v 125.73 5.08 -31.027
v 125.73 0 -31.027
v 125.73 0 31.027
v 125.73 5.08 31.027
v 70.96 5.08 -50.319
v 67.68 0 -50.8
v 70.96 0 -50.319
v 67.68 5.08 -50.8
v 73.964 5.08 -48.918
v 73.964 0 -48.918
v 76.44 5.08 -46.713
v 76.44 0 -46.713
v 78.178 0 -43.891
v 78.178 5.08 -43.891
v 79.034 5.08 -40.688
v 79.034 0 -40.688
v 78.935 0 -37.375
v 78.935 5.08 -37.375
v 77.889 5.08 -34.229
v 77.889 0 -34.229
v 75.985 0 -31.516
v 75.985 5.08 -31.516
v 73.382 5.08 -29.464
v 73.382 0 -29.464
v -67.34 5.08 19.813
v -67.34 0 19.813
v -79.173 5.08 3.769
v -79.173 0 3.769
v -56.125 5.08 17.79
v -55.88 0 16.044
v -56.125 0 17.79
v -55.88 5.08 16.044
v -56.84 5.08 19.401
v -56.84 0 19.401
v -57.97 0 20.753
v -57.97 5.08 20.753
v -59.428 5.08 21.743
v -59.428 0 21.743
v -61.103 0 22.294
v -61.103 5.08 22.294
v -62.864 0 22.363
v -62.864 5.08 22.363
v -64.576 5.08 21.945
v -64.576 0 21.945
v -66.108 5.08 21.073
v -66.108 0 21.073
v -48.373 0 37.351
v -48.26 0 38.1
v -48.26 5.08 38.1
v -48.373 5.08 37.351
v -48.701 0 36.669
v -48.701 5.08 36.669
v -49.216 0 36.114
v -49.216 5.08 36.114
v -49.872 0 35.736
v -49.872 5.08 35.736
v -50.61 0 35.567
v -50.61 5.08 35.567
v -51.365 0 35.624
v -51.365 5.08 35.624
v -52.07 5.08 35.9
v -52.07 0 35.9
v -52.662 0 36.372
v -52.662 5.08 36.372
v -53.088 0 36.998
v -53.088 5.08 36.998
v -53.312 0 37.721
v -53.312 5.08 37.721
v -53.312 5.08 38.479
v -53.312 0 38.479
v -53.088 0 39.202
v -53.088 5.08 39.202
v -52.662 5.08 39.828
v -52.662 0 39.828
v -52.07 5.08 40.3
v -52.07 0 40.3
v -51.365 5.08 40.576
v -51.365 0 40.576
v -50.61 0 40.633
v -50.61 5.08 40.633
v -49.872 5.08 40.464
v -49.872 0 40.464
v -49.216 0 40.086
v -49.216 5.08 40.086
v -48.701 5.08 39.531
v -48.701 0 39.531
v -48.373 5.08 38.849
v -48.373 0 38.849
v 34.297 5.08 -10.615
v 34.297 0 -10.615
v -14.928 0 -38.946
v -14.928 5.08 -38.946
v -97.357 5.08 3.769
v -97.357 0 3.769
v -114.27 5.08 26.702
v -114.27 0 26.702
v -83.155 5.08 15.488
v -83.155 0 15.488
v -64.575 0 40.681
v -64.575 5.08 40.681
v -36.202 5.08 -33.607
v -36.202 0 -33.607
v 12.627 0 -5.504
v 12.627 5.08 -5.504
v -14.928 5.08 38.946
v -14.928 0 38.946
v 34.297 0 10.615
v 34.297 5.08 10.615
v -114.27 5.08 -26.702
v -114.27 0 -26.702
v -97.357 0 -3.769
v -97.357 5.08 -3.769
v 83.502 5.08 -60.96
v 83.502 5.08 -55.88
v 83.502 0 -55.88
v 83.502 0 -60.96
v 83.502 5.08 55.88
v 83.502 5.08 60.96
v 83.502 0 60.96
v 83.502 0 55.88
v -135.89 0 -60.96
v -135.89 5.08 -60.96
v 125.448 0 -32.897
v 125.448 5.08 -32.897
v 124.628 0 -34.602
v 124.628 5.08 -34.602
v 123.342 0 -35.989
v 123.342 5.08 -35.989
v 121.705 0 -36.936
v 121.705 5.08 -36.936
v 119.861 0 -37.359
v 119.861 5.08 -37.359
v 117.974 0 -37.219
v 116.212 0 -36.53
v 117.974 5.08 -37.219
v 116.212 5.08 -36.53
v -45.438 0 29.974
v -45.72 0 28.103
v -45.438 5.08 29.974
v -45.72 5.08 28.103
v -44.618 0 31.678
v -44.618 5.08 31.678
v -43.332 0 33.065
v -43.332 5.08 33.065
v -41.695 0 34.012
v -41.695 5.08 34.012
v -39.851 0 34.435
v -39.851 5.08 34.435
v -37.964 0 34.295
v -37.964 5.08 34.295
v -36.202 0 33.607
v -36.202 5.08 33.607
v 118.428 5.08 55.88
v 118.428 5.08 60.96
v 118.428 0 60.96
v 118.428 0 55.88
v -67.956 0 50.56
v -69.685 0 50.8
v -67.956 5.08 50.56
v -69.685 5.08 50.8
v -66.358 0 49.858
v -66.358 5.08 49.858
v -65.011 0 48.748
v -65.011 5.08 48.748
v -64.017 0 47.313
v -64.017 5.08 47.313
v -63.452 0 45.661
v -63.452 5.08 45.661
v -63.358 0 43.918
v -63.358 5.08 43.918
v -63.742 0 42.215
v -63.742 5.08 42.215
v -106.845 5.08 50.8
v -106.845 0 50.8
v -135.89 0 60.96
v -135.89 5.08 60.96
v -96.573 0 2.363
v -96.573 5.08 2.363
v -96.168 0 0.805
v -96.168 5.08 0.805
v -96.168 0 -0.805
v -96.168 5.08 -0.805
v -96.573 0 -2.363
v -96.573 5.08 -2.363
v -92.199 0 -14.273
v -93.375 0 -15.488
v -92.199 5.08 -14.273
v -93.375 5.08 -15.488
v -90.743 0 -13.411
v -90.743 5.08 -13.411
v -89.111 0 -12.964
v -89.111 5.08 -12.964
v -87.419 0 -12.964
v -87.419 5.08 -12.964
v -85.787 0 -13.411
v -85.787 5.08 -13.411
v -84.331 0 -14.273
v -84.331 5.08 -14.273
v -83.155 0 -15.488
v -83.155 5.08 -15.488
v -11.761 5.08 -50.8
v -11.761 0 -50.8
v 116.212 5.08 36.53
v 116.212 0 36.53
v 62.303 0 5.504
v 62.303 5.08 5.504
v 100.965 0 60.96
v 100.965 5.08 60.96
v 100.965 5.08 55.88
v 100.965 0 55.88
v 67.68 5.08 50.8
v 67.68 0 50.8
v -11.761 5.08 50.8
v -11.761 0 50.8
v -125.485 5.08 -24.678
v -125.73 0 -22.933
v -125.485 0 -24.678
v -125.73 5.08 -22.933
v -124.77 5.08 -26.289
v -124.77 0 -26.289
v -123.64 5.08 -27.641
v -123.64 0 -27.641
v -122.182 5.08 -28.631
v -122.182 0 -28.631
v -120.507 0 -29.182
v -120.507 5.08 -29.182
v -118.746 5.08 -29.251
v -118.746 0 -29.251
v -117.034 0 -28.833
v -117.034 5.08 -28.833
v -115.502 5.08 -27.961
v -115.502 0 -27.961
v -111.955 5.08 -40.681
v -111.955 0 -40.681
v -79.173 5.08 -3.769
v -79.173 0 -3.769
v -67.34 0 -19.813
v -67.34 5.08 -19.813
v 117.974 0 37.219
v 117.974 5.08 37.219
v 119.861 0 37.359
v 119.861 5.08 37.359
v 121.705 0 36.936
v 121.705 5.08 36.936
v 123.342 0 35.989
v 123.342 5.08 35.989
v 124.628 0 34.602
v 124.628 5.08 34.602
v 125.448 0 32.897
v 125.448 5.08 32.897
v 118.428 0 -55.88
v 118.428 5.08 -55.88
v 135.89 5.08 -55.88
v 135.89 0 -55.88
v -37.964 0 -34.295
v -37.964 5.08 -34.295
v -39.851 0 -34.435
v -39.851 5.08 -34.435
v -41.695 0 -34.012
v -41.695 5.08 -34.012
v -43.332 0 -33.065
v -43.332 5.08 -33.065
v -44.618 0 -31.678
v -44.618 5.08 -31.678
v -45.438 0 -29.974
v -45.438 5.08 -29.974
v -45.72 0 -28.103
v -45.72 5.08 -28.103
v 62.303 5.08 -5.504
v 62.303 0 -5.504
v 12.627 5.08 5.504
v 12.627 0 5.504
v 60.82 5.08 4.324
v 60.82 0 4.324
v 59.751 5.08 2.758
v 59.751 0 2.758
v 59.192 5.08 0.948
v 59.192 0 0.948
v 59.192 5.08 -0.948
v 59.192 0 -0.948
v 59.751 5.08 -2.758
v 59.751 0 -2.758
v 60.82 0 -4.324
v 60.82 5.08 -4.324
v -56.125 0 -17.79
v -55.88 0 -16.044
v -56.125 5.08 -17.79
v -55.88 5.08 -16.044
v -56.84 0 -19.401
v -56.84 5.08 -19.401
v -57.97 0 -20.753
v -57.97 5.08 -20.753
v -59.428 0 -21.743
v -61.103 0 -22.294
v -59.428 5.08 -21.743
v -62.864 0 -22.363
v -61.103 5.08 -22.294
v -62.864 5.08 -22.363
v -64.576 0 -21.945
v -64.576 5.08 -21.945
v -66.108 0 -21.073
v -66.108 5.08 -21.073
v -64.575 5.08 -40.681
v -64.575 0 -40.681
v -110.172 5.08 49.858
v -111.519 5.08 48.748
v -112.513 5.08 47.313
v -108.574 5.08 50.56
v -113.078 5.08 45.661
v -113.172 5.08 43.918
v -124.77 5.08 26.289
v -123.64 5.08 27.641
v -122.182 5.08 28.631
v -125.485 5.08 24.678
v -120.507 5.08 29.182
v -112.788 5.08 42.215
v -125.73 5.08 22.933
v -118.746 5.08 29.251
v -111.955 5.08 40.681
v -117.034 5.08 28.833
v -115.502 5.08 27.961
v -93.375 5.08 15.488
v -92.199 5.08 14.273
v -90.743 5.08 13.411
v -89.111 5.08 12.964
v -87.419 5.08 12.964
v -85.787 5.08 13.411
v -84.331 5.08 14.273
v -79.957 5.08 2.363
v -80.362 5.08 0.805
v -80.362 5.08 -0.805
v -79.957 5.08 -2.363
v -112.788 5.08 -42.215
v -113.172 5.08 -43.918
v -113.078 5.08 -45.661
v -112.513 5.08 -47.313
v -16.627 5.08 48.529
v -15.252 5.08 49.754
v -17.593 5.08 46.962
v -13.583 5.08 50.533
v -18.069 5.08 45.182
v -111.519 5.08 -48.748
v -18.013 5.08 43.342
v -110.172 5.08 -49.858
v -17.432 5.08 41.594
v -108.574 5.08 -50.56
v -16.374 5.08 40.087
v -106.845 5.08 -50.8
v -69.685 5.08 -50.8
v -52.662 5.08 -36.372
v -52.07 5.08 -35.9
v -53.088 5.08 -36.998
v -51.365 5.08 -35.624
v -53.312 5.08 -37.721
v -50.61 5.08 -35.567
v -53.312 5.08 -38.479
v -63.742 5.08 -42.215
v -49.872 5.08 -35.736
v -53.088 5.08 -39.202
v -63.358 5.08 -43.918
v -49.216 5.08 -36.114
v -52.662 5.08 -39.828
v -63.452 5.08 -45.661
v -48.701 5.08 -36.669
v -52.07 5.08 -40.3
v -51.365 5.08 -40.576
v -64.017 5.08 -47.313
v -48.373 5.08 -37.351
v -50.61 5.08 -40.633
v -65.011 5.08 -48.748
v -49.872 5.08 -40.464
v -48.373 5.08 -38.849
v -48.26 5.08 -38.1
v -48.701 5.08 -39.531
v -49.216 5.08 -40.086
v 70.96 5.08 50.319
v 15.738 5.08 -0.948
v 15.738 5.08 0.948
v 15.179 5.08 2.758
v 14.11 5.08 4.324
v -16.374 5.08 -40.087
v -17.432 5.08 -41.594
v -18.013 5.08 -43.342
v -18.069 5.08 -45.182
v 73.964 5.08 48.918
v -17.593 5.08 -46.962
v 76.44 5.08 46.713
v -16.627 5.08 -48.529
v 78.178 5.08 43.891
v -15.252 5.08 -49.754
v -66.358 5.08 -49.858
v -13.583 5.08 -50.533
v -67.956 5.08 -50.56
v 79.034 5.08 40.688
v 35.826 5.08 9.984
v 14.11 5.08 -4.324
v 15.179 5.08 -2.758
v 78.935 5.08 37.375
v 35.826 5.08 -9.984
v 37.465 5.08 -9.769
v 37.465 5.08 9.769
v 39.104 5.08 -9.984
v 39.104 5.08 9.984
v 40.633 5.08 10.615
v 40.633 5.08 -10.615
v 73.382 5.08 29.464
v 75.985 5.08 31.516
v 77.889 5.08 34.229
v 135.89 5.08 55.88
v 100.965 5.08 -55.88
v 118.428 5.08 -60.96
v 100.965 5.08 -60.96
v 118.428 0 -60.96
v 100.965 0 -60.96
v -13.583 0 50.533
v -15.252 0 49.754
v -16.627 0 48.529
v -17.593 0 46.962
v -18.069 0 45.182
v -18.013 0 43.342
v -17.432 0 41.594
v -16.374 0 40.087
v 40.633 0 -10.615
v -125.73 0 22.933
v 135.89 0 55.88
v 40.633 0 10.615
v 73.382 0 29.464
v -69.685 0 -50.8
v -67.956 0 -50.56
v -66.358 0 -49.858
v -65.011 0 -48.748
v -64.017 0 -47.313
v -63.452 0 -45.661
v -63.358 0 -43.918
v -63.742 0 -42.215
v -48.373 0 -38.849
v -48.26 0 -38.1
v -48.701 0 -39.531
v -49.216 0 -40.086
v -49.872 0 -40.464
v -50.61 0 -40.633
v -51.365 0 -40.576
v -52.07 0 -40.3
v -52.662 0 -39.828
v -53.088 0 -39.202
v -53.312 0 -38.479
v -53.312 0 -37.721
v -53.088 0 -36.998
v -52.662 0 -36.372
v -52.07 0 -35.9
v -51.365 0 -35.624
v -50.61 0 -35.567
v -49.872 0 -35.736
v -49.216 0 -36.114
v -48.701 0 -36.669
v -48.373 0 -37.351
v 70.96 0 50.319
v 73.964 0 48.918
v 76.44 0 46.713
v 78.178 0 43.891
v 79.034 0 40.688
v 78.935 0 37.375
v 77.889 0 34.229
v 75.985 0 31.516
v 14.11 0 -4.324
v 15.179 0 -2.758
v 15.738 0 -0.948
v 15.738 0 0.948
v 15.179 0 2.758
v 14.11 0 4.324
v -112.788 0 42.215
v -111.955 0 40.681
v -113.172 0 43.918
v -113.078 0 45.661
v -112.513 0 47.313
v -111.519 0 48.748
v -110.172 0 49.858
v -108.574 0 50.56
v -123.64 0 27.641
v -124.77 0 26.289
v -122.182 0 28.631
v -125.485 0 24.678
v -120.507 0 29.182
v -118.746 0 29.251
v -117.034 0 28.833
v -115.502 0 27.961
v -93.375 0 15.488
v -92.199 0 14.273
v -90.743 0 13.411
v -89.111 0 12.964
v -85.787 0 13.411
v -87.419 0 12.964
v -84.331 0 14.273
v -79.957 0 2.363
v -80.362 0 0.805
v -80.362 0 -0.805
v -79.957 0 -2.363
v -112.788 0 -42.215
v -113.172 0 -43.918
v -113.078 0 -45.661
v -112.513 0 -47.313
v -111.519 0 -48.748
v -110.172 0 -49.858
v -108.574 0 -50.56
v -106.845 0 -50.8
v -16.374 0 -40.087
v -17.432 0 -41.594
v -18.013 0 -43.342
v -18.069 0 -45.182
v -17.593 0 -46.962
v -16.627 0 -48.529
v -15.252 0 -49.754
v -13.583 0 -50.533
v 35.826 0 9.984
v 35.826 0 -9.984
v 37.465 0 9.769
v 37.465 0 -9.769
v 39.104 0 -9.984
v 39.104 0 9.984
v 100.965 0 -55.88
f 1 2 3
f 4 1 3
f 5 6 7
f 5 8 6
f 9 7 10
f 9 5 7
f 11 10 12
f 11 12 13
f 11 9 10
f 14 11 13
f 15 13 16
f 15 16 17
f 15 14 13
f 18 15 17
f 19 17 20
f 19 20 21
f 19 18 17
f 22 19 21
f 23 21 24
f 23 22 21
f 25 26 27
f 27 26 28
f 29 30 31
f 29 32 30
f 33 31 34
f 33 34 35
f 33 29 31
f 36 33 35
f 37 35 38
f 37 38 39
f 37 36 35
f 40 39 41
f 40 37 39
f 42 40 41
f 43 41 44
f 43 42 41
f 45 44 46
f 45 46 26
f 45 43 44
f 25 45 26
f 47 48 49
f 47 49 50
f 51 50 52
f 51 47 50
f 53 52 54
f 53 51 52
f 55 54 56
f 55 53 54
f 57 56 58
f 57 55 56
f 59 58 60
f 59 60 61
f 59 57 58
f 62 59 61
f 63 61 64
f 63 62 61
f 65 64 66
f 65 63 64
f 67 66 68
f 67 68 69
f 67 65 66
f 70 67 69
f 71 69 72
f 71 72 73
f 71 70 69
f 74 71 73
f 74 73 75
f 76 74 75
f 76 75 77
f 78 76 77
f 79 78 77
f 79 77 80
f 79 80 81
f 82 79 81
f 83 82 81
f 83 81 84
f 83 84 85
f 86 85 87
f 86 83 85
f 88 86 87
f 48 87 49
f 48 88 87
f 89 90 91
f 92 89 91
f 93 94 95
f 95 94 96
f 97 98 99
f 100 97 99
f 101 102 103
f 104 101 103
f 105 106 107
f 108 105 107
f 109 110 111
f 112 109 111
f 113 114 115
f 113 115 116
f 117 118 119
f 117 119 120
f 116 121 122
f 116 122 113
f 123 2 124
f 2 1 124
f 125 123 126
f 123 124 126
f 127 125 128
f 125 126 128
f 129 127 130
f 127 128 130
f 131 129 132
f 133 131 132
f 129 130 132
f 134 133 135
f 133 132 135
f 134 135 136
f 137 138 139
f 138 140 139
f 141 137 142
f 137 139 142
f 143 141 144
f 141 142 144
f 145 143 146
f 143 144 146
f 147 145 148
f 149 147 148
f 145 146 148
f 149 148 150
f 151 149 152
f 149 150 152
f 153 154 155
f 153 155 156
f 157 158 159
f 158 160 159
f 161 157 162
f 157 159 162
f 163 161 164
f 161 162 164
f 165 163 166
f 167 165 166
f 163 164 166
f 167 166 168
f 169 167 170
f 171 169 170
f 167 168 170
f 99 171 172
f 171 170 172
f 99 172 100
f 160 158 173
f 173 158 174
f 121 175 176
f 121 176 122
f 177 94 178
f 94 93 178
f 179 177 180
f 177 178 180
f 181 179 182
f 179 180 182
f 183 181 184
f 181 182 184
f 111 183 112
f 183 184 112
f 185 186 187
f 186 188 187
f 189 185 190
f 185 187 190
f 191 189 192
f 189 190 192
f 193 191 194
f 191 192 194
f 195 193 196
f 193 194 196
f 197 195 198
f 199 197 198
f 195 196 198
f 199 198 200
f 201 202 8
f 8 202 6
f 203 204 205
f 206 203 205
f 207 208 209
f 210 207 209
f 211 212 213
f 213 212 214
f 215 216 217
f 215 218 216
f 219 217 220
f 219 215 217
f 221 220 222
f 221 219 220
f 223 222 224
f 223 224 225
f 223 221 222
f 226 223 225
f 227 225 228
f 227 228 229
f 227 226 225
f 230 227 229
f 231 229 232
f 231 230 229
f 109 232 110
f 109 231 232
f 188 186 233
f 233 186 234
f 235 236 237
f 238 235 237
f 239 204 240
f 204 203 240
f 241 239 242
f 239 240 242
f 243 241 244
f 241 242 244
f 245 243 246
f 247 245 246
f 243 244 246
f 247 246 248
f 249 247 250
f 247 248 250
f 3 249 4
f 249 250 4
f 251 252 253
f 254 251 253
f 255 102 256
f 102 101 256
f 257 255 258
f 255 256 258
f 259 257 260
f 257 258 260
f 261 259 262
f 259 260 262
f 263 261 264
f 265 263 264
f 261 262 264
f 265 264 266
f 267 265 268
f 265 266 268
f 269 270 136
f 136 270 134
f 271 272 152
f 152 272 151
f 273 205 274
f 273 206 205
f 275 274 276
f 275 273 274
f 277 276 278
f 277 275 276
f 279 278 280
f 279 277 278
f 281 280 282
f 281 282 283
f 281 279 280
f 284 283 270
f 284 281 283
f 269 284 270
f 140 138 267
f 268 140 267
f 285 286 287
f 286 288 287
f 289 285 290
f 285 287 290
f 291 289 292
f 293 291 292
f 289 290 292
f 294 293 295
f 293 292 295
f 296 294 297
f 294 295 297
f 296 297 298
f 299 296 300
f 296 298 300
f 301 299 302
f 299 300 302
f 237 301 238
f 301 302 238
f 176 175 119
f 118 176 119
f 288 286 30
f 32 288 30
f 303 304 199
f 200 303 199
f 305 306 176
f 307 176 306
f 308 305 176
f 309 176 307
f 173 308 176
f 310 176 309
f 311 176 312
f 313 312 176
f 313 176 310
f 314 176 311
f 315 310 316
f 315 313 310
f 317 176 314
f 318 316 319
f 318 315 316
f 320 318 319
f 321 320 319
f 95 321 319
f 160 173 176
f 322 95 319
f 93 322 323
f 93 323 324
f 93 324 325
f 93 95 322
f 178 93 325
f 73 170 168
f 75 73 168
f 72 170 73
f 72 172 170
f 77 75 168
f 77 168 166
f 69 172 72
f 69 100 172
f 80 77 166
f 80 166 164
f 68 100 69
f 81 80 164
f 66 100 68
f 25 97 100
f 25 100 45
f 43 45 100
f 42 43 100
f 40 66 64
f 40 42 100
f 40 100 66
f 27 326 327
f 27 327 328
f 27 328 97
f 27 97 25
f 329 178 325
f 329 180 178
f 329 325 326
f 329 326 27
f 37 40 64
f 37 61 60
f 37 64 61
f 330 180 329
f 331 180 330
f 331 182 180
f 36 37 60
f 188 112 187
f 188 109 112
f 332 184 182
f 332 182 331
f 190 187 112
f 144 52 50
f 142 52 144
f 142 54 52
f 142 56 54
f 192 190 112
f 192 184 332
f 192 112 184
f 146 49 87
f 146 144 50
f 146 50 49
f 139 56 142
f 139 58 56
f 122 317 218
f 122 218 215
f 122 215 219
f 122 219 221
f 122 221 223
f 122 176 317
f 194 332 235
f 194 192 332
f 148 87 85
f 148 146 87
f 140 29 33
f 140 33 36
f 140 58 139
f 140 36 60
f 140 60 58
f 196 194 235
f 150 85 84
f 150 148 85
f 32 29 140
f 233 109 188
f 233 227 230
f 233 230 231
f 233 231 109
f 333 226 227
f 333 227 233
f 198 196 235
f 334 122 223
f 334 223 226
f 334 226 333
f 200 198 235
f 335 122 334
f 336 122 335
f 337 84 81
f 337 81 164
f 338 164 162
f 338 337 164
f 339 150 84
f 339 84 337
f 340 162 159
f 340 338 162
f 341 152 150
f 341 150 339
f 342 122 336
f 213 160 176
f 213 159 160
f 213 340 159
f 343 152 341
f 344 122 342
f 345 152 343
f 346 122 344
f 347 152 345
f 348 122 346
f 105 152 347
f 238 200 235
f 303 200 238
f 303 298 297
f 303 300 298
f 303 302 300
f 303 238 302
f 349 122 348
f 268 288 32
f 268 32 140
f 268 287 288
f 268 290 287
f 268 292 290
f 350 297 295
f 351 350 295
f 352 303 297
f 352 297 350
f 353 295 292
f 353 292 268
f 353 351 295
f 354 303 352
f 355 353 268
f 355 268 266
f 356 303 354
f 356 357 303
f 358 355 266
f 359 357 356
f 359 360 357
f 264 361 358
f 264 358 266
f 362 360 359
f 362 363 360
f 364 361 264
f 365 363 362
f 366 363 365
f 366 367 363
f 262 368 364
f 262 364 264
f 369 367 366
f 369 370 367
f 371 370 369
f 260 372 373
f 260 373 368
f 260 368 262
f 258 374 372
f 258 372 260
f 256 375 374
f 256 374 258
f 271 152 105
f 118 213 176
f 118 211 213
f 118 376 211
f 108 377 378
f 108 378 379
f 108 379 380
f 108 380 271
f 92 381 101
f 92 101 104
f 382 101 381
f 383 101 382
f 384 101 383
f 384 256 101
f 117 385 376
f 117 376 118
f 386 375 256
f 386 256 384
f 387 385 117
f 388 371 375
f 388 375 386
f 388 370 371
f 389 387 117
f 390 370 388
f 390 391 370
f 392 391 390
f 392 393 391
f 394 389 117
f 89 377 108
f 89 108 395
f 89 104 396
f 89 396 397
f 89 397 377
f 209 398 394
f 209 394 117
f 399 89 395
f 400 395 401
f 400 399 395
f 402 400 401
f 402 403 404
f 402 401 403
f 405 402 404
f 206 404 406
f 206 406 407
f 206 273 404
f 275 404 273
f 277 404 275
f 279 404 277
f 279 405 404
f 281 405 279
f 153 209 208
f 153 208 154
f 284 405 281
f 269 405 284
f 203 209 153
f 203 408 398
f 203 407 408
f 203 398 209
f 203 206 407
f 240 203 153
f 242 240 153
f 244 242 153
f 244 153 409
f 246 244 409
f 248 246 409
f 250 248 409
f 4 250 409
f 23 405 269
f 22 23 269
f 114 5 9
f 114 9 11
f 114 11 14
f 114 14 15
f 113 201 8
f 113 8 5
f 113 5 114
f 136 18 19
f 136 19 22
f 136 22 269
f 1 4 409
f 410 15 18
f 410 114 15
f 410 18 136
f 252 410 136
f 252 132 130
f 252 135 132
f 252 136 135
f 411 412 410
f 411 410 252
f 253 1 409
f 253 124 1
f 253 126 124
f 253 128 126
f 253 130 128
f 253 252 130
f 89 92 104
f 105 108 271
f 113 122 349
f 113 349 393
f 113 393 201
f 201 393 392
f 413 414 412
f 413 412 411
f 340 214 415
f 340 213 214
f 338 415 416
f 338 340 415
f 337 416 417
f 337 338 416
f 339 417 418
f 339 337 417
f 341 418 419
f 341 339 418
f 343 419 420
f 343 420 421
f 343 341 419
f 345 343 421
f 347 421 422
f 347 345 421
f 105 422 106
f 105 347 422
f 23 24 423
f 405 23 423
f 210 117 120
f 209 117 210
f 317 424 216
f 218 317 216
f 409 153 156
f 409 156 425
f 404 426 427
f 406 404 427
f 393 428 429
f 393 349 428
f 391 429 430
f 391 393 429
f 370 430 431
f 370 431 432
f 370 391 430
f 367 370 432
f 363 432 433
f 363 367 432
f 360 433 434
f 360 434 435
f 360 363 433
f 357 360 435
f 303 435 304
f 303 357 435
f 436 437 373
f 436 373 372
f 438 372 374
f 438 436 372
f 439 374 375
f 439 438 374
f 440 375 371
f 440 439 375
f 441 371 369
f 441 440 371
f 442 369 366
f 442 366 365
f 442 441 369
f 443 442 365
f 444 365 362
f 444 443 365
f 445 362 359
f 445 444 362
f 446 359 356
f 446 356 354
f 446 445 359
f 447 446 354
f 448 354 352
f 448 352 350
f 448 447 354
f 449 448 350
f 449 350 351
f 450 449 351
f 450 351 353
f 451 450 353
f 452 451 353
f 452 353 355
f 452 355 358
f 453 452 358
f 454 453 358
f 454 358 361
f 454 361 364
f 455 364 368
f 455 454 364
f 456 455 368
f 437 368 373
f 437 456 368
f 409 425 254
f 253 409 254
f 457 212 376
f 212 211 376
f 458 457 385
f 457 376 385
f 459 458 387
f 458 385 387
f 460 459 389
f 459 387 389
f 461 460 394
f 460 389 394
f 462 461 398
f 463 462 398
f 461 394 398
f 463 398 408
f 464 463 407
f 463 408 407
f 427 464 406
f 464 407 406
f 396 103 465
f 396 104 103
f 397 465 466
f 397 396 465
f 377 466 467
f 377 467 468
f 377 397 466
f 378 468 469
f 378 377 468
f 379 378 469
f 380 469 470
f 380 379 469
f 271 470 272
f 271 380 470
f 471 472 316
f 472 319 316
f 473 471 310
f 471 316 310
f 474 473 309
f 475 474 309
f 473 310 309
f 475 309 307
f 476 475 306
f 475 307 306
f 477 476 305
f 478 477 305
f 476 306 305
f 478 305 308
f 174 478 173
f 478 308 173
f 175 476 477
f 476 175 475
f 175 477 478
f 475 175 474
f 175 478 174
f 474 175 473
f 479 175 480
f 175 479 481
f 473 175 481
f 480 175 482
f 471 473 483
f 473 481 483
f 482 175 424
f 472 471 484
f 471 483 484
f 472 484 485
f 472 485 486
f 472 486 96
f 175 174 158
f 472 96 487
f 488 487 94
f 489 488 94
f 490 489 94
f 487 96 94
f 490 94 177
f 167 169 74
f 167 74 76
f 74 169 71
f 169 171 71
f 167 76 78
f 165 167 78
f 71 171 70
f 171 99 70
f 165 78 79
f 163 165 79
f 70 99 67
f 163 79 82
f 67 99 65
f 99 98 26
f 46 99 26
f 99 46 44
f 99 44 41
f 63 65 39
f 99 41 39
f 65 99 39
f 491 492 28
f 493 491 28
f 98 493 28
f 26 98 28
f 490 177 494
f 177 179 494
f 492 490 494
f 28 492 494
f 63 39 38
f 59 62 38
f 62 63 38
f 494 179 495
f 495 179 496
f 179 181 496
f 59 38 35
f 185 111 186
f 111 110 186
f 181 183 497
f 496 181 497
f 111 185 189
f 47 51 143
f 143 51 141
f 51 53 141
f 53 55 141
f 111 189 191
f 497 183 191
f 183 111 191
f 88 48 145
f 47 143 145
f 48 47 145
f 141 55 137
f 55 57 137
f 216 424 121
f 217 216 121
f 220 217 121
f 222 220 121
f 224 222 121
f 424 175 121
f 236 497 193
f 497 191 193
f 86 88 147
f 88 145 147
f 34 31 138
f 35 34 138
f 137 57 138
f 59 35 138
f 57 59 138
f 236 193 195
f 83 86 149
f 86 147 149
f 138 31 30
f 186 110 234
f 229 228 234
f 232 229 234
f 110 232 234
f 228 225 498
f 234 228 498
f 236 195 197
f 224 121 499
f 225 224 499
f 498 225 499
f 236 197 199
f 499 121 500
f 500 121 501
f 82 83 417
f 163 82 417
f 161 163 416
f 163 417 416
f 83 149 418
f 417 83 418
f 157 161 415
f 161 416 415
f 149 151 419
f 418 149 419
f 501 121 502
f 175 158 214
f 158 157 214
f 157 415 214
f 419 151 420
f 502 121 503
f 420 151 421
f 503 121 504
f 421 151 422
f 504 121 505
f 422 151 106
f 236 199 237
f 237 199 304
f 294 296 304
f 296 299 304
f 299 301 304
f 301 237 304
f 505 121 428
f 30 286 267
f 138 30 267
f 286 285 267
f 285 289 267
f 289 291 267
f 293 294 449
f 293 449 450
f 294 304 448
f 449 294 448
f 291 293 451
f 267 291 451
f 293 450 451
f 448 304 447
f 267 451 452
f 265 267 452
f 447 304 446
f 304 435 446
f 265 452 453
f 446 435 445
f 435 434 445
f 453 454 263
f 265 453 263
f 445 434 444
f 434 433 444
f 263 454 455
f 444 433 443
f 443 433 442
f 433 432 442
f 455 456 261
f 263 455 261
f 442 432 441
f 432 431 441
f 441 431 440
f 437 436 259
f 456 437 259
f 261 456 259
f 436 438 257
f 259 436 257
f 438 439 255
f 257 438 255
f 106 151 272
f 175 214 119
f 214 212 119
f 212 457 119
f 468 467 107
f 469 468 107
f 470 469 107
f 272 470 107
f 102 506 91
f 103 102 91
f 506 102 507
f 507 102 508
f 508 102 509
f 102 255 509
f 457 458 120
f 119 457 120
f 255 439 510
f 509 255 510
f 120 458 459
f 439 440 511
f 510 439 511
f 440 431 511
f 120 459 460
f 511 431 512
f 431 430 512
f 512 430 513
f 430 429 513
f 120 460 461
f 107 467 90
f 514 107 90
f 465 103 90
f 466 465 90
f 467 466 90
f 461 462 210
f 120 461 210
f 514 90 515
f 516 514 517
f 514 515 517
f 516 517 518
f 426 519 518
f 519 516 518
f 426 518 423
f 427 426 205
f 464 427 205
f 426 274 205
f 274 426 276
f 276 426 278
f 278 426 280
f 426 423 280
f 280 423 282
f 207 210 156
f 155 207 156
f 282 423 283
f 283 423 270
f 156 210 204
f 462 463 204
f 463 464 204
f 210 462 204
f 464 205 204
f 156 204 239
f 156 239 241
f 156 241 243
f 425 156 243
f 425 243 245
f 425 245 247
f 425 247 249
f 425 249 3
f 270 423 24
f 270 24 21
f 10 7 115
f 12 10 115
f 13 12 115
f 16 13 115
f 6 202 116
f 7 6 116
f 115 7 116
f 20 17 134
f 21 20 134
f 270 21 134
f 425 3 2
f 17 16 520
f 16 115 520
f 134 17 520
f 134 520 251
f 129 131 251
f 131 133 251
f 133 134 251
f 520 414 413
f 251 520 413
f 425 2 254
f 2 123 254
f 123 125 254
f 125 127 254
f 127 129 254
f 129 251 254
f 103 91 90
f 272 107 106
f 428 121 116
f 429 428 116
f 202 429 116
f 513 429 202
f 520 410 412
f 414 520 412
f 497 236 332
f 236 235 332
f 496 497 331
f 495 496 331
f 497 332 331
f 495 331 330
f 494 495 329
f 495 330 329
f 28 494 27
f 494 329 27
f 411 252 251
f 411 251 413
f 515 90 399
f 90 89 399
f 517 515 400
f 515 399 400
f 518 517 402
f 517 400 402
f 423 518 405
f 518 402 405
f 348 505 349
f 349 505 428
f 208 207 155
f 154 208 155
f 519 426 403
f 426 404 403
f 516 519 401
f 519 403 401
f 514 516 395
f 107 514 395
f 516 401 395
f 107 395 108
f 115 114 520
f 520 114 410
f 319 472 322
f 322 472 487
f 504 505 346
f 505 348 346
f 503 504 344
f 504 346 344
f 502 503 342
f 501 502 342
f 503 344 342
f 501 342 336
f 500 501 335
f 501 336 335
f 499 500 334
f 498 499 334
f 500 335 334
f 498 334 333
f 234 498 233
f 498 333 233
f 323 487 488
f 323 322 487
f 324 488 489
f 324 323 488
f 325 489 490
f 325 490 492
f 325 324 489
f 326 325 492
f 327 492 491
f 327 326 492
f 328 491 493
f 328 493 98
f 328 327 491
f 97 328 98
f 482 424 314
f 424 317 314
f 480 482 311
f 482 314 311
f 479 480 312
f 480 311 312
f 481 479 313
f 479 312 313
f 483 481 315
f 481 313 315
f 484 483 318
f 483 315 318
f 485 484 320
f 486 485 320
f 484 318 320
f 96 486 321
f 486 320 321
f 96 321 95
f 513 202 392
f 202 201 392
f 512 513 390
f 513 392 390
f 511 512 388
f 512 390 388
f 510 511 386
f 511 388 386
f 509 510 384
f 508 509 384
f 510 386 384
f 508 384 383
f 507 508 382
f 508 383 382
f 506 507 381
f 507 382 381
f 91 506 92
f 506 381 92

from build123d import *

# Parameters (mm, degrees)
SKETCH1_W           = 271.78
SKETCH1_H           = 121.92
SKETCH1_R           = 2.54
BOSS_EXTRUDE1_DEPTH = 5.08
FILLET1_R           = 6.35
SKETCH3_W           = 17.4625
SKETCH3_H           = 5.08
CUT_EXTRUDE2_DEPTH  = 7.62
FILLET2_R           = 11.43


with BuildPart() as part:
    # Sketch1 → Boss-Extrude1 (new body)
    with BuildSketch(Plane(origin=(0, 0, 0), x_dir=(1, 0, 0), z_dir=(0, 1, 0))):
        Rectangle(SKETCH1_W, SKETCH1_H)
        with Locations((-50.8, -38.1)):
            Circle(SKETCH1_R, mode=Mode.SUBTRACT)
        Polygon((-125.73, 42.241214341), (-94.577104423, 0), (-125.73, -42.241214341), align=None, mode=Mode.SUBTRACT)
        Polygon((-88.265, -8.558785659), (-57.112104423, -50.8), (-119.417895577, -50.8), align=None, mode=Mode.SUBTRACT)
        Polygon((-55.88, -35.353078748), (-81.952895577, 0), (-55.88, 35.353078748), align=None, mode=Mode.SUBTRACT)
        Polygon((-35.524026052, -50.8), (37.465, -8.791927452), (110.454026052, -50.8), align=None, mode=Mode.SUBTRACT)
        Polygon((22.189026052, 0), (-45.72, -39.084331541), (-45.72, 39.084331541), align=None, mode=Mode.SUBTRACT)
        Polygon((-57.112104423, 50.8), (-88.265, 8.558785659), (-119.417895577, 50.8), align=None, mode=Mode.SUBTRACT)
        with Locations((-50.8, 38.1)):
            Circle(SKETCH1_R, mode=Mode.SUBTRACT)
        Polygon((52.740973948, 0), (125.73, 42.008072548), (125.73, -42.008072548), align=None, mode=Mode.SUBTRACT)
        Polygon((110.454026052, 50.8), (37.465, 8.791927452), (-35.524026052, 50.8), align=None, mode=Mode.SUBTRACT)
    extrude(amount=BOSS_EXTRUDE1_DEPTH)

    # Fillet1
    fillet1_edges = [part.edges().sort_by_distance(p)[0] for p in [
        (-35.524026052, 2.54, 50.8),
        (37.465, 2.54, 8.791927452),
        (125.73, 2.54, 42.008072548),
        (125.73, 2.54, -42.008072548),
        (52.740973948, 2.54, 0),
        (-45.72, 2.54, 39.084331541),
        (22.189026052, 2.54, 0),
        (-45.72, 2.54, -39.084331541),
        (-35.524026052, 2.54, -50.8),
        (37.465, 2.54, -8.791927452),
        (-125.73, 2.54, -42.241214341),
        (-125.73, 2.54, 42.241214341),
        (-94.577104423, 2.54, 0),
        (-57.112104423, 2.54, -50.8),
        (-119.417895577, 2.54, -50.8),
        (-88.265, 2.54, -8.558785659),
        (-119.417895577, 2.54, 50.8),
        (-57.112104423, 2.54, 50.8),
        (-88.265, 2.54, 8.558785659),
        (-55.88, 2.54, 35.353078748),
        (-55.88, 2.54, -35.353078748),
        (-81.952895577, 2.54, 0),
    ]]
    fillet(fillet1_edges, radius=FILLET1_R)

    # Sketch3 → Cut-Extrude2 (cut)
    with BuildSketch(Plane(origin=(0, 5.08, 0), x_dir=(1, 0, 0), z_dir=(0, 1, 0))):
        with Locations((92.23375, 58.42)):
            Rectangle(SKETCH3_W, SKETCH3_H)
        with Locations((127.15875, 58.42)):
            Rectangle(SKETCH3_W, SKETCH3_H)
        with Locations((92.23375, -58.42)):
            Rectangle(SKETCH3_W, SKETCH3_H)
        with Locations((127.15875, -58.42)):
            Rectangle(SKETCH3_W, SKETCH3_H)
    extrude(amount=-CUT_EXTRUDE2_DEPTH, mode=Mode.SUBTRACT)

    # Fillet2
    fillet2_edges = [part.edges().sort_by_distance(p)[0] for p in [
        (110.454026052, 2.54, 50.8),
        (110.454026052, 2.54, -50.8),
    ]]
    fillet(fillet2_edges, radius=FILLET2_R)


solid = part.part
